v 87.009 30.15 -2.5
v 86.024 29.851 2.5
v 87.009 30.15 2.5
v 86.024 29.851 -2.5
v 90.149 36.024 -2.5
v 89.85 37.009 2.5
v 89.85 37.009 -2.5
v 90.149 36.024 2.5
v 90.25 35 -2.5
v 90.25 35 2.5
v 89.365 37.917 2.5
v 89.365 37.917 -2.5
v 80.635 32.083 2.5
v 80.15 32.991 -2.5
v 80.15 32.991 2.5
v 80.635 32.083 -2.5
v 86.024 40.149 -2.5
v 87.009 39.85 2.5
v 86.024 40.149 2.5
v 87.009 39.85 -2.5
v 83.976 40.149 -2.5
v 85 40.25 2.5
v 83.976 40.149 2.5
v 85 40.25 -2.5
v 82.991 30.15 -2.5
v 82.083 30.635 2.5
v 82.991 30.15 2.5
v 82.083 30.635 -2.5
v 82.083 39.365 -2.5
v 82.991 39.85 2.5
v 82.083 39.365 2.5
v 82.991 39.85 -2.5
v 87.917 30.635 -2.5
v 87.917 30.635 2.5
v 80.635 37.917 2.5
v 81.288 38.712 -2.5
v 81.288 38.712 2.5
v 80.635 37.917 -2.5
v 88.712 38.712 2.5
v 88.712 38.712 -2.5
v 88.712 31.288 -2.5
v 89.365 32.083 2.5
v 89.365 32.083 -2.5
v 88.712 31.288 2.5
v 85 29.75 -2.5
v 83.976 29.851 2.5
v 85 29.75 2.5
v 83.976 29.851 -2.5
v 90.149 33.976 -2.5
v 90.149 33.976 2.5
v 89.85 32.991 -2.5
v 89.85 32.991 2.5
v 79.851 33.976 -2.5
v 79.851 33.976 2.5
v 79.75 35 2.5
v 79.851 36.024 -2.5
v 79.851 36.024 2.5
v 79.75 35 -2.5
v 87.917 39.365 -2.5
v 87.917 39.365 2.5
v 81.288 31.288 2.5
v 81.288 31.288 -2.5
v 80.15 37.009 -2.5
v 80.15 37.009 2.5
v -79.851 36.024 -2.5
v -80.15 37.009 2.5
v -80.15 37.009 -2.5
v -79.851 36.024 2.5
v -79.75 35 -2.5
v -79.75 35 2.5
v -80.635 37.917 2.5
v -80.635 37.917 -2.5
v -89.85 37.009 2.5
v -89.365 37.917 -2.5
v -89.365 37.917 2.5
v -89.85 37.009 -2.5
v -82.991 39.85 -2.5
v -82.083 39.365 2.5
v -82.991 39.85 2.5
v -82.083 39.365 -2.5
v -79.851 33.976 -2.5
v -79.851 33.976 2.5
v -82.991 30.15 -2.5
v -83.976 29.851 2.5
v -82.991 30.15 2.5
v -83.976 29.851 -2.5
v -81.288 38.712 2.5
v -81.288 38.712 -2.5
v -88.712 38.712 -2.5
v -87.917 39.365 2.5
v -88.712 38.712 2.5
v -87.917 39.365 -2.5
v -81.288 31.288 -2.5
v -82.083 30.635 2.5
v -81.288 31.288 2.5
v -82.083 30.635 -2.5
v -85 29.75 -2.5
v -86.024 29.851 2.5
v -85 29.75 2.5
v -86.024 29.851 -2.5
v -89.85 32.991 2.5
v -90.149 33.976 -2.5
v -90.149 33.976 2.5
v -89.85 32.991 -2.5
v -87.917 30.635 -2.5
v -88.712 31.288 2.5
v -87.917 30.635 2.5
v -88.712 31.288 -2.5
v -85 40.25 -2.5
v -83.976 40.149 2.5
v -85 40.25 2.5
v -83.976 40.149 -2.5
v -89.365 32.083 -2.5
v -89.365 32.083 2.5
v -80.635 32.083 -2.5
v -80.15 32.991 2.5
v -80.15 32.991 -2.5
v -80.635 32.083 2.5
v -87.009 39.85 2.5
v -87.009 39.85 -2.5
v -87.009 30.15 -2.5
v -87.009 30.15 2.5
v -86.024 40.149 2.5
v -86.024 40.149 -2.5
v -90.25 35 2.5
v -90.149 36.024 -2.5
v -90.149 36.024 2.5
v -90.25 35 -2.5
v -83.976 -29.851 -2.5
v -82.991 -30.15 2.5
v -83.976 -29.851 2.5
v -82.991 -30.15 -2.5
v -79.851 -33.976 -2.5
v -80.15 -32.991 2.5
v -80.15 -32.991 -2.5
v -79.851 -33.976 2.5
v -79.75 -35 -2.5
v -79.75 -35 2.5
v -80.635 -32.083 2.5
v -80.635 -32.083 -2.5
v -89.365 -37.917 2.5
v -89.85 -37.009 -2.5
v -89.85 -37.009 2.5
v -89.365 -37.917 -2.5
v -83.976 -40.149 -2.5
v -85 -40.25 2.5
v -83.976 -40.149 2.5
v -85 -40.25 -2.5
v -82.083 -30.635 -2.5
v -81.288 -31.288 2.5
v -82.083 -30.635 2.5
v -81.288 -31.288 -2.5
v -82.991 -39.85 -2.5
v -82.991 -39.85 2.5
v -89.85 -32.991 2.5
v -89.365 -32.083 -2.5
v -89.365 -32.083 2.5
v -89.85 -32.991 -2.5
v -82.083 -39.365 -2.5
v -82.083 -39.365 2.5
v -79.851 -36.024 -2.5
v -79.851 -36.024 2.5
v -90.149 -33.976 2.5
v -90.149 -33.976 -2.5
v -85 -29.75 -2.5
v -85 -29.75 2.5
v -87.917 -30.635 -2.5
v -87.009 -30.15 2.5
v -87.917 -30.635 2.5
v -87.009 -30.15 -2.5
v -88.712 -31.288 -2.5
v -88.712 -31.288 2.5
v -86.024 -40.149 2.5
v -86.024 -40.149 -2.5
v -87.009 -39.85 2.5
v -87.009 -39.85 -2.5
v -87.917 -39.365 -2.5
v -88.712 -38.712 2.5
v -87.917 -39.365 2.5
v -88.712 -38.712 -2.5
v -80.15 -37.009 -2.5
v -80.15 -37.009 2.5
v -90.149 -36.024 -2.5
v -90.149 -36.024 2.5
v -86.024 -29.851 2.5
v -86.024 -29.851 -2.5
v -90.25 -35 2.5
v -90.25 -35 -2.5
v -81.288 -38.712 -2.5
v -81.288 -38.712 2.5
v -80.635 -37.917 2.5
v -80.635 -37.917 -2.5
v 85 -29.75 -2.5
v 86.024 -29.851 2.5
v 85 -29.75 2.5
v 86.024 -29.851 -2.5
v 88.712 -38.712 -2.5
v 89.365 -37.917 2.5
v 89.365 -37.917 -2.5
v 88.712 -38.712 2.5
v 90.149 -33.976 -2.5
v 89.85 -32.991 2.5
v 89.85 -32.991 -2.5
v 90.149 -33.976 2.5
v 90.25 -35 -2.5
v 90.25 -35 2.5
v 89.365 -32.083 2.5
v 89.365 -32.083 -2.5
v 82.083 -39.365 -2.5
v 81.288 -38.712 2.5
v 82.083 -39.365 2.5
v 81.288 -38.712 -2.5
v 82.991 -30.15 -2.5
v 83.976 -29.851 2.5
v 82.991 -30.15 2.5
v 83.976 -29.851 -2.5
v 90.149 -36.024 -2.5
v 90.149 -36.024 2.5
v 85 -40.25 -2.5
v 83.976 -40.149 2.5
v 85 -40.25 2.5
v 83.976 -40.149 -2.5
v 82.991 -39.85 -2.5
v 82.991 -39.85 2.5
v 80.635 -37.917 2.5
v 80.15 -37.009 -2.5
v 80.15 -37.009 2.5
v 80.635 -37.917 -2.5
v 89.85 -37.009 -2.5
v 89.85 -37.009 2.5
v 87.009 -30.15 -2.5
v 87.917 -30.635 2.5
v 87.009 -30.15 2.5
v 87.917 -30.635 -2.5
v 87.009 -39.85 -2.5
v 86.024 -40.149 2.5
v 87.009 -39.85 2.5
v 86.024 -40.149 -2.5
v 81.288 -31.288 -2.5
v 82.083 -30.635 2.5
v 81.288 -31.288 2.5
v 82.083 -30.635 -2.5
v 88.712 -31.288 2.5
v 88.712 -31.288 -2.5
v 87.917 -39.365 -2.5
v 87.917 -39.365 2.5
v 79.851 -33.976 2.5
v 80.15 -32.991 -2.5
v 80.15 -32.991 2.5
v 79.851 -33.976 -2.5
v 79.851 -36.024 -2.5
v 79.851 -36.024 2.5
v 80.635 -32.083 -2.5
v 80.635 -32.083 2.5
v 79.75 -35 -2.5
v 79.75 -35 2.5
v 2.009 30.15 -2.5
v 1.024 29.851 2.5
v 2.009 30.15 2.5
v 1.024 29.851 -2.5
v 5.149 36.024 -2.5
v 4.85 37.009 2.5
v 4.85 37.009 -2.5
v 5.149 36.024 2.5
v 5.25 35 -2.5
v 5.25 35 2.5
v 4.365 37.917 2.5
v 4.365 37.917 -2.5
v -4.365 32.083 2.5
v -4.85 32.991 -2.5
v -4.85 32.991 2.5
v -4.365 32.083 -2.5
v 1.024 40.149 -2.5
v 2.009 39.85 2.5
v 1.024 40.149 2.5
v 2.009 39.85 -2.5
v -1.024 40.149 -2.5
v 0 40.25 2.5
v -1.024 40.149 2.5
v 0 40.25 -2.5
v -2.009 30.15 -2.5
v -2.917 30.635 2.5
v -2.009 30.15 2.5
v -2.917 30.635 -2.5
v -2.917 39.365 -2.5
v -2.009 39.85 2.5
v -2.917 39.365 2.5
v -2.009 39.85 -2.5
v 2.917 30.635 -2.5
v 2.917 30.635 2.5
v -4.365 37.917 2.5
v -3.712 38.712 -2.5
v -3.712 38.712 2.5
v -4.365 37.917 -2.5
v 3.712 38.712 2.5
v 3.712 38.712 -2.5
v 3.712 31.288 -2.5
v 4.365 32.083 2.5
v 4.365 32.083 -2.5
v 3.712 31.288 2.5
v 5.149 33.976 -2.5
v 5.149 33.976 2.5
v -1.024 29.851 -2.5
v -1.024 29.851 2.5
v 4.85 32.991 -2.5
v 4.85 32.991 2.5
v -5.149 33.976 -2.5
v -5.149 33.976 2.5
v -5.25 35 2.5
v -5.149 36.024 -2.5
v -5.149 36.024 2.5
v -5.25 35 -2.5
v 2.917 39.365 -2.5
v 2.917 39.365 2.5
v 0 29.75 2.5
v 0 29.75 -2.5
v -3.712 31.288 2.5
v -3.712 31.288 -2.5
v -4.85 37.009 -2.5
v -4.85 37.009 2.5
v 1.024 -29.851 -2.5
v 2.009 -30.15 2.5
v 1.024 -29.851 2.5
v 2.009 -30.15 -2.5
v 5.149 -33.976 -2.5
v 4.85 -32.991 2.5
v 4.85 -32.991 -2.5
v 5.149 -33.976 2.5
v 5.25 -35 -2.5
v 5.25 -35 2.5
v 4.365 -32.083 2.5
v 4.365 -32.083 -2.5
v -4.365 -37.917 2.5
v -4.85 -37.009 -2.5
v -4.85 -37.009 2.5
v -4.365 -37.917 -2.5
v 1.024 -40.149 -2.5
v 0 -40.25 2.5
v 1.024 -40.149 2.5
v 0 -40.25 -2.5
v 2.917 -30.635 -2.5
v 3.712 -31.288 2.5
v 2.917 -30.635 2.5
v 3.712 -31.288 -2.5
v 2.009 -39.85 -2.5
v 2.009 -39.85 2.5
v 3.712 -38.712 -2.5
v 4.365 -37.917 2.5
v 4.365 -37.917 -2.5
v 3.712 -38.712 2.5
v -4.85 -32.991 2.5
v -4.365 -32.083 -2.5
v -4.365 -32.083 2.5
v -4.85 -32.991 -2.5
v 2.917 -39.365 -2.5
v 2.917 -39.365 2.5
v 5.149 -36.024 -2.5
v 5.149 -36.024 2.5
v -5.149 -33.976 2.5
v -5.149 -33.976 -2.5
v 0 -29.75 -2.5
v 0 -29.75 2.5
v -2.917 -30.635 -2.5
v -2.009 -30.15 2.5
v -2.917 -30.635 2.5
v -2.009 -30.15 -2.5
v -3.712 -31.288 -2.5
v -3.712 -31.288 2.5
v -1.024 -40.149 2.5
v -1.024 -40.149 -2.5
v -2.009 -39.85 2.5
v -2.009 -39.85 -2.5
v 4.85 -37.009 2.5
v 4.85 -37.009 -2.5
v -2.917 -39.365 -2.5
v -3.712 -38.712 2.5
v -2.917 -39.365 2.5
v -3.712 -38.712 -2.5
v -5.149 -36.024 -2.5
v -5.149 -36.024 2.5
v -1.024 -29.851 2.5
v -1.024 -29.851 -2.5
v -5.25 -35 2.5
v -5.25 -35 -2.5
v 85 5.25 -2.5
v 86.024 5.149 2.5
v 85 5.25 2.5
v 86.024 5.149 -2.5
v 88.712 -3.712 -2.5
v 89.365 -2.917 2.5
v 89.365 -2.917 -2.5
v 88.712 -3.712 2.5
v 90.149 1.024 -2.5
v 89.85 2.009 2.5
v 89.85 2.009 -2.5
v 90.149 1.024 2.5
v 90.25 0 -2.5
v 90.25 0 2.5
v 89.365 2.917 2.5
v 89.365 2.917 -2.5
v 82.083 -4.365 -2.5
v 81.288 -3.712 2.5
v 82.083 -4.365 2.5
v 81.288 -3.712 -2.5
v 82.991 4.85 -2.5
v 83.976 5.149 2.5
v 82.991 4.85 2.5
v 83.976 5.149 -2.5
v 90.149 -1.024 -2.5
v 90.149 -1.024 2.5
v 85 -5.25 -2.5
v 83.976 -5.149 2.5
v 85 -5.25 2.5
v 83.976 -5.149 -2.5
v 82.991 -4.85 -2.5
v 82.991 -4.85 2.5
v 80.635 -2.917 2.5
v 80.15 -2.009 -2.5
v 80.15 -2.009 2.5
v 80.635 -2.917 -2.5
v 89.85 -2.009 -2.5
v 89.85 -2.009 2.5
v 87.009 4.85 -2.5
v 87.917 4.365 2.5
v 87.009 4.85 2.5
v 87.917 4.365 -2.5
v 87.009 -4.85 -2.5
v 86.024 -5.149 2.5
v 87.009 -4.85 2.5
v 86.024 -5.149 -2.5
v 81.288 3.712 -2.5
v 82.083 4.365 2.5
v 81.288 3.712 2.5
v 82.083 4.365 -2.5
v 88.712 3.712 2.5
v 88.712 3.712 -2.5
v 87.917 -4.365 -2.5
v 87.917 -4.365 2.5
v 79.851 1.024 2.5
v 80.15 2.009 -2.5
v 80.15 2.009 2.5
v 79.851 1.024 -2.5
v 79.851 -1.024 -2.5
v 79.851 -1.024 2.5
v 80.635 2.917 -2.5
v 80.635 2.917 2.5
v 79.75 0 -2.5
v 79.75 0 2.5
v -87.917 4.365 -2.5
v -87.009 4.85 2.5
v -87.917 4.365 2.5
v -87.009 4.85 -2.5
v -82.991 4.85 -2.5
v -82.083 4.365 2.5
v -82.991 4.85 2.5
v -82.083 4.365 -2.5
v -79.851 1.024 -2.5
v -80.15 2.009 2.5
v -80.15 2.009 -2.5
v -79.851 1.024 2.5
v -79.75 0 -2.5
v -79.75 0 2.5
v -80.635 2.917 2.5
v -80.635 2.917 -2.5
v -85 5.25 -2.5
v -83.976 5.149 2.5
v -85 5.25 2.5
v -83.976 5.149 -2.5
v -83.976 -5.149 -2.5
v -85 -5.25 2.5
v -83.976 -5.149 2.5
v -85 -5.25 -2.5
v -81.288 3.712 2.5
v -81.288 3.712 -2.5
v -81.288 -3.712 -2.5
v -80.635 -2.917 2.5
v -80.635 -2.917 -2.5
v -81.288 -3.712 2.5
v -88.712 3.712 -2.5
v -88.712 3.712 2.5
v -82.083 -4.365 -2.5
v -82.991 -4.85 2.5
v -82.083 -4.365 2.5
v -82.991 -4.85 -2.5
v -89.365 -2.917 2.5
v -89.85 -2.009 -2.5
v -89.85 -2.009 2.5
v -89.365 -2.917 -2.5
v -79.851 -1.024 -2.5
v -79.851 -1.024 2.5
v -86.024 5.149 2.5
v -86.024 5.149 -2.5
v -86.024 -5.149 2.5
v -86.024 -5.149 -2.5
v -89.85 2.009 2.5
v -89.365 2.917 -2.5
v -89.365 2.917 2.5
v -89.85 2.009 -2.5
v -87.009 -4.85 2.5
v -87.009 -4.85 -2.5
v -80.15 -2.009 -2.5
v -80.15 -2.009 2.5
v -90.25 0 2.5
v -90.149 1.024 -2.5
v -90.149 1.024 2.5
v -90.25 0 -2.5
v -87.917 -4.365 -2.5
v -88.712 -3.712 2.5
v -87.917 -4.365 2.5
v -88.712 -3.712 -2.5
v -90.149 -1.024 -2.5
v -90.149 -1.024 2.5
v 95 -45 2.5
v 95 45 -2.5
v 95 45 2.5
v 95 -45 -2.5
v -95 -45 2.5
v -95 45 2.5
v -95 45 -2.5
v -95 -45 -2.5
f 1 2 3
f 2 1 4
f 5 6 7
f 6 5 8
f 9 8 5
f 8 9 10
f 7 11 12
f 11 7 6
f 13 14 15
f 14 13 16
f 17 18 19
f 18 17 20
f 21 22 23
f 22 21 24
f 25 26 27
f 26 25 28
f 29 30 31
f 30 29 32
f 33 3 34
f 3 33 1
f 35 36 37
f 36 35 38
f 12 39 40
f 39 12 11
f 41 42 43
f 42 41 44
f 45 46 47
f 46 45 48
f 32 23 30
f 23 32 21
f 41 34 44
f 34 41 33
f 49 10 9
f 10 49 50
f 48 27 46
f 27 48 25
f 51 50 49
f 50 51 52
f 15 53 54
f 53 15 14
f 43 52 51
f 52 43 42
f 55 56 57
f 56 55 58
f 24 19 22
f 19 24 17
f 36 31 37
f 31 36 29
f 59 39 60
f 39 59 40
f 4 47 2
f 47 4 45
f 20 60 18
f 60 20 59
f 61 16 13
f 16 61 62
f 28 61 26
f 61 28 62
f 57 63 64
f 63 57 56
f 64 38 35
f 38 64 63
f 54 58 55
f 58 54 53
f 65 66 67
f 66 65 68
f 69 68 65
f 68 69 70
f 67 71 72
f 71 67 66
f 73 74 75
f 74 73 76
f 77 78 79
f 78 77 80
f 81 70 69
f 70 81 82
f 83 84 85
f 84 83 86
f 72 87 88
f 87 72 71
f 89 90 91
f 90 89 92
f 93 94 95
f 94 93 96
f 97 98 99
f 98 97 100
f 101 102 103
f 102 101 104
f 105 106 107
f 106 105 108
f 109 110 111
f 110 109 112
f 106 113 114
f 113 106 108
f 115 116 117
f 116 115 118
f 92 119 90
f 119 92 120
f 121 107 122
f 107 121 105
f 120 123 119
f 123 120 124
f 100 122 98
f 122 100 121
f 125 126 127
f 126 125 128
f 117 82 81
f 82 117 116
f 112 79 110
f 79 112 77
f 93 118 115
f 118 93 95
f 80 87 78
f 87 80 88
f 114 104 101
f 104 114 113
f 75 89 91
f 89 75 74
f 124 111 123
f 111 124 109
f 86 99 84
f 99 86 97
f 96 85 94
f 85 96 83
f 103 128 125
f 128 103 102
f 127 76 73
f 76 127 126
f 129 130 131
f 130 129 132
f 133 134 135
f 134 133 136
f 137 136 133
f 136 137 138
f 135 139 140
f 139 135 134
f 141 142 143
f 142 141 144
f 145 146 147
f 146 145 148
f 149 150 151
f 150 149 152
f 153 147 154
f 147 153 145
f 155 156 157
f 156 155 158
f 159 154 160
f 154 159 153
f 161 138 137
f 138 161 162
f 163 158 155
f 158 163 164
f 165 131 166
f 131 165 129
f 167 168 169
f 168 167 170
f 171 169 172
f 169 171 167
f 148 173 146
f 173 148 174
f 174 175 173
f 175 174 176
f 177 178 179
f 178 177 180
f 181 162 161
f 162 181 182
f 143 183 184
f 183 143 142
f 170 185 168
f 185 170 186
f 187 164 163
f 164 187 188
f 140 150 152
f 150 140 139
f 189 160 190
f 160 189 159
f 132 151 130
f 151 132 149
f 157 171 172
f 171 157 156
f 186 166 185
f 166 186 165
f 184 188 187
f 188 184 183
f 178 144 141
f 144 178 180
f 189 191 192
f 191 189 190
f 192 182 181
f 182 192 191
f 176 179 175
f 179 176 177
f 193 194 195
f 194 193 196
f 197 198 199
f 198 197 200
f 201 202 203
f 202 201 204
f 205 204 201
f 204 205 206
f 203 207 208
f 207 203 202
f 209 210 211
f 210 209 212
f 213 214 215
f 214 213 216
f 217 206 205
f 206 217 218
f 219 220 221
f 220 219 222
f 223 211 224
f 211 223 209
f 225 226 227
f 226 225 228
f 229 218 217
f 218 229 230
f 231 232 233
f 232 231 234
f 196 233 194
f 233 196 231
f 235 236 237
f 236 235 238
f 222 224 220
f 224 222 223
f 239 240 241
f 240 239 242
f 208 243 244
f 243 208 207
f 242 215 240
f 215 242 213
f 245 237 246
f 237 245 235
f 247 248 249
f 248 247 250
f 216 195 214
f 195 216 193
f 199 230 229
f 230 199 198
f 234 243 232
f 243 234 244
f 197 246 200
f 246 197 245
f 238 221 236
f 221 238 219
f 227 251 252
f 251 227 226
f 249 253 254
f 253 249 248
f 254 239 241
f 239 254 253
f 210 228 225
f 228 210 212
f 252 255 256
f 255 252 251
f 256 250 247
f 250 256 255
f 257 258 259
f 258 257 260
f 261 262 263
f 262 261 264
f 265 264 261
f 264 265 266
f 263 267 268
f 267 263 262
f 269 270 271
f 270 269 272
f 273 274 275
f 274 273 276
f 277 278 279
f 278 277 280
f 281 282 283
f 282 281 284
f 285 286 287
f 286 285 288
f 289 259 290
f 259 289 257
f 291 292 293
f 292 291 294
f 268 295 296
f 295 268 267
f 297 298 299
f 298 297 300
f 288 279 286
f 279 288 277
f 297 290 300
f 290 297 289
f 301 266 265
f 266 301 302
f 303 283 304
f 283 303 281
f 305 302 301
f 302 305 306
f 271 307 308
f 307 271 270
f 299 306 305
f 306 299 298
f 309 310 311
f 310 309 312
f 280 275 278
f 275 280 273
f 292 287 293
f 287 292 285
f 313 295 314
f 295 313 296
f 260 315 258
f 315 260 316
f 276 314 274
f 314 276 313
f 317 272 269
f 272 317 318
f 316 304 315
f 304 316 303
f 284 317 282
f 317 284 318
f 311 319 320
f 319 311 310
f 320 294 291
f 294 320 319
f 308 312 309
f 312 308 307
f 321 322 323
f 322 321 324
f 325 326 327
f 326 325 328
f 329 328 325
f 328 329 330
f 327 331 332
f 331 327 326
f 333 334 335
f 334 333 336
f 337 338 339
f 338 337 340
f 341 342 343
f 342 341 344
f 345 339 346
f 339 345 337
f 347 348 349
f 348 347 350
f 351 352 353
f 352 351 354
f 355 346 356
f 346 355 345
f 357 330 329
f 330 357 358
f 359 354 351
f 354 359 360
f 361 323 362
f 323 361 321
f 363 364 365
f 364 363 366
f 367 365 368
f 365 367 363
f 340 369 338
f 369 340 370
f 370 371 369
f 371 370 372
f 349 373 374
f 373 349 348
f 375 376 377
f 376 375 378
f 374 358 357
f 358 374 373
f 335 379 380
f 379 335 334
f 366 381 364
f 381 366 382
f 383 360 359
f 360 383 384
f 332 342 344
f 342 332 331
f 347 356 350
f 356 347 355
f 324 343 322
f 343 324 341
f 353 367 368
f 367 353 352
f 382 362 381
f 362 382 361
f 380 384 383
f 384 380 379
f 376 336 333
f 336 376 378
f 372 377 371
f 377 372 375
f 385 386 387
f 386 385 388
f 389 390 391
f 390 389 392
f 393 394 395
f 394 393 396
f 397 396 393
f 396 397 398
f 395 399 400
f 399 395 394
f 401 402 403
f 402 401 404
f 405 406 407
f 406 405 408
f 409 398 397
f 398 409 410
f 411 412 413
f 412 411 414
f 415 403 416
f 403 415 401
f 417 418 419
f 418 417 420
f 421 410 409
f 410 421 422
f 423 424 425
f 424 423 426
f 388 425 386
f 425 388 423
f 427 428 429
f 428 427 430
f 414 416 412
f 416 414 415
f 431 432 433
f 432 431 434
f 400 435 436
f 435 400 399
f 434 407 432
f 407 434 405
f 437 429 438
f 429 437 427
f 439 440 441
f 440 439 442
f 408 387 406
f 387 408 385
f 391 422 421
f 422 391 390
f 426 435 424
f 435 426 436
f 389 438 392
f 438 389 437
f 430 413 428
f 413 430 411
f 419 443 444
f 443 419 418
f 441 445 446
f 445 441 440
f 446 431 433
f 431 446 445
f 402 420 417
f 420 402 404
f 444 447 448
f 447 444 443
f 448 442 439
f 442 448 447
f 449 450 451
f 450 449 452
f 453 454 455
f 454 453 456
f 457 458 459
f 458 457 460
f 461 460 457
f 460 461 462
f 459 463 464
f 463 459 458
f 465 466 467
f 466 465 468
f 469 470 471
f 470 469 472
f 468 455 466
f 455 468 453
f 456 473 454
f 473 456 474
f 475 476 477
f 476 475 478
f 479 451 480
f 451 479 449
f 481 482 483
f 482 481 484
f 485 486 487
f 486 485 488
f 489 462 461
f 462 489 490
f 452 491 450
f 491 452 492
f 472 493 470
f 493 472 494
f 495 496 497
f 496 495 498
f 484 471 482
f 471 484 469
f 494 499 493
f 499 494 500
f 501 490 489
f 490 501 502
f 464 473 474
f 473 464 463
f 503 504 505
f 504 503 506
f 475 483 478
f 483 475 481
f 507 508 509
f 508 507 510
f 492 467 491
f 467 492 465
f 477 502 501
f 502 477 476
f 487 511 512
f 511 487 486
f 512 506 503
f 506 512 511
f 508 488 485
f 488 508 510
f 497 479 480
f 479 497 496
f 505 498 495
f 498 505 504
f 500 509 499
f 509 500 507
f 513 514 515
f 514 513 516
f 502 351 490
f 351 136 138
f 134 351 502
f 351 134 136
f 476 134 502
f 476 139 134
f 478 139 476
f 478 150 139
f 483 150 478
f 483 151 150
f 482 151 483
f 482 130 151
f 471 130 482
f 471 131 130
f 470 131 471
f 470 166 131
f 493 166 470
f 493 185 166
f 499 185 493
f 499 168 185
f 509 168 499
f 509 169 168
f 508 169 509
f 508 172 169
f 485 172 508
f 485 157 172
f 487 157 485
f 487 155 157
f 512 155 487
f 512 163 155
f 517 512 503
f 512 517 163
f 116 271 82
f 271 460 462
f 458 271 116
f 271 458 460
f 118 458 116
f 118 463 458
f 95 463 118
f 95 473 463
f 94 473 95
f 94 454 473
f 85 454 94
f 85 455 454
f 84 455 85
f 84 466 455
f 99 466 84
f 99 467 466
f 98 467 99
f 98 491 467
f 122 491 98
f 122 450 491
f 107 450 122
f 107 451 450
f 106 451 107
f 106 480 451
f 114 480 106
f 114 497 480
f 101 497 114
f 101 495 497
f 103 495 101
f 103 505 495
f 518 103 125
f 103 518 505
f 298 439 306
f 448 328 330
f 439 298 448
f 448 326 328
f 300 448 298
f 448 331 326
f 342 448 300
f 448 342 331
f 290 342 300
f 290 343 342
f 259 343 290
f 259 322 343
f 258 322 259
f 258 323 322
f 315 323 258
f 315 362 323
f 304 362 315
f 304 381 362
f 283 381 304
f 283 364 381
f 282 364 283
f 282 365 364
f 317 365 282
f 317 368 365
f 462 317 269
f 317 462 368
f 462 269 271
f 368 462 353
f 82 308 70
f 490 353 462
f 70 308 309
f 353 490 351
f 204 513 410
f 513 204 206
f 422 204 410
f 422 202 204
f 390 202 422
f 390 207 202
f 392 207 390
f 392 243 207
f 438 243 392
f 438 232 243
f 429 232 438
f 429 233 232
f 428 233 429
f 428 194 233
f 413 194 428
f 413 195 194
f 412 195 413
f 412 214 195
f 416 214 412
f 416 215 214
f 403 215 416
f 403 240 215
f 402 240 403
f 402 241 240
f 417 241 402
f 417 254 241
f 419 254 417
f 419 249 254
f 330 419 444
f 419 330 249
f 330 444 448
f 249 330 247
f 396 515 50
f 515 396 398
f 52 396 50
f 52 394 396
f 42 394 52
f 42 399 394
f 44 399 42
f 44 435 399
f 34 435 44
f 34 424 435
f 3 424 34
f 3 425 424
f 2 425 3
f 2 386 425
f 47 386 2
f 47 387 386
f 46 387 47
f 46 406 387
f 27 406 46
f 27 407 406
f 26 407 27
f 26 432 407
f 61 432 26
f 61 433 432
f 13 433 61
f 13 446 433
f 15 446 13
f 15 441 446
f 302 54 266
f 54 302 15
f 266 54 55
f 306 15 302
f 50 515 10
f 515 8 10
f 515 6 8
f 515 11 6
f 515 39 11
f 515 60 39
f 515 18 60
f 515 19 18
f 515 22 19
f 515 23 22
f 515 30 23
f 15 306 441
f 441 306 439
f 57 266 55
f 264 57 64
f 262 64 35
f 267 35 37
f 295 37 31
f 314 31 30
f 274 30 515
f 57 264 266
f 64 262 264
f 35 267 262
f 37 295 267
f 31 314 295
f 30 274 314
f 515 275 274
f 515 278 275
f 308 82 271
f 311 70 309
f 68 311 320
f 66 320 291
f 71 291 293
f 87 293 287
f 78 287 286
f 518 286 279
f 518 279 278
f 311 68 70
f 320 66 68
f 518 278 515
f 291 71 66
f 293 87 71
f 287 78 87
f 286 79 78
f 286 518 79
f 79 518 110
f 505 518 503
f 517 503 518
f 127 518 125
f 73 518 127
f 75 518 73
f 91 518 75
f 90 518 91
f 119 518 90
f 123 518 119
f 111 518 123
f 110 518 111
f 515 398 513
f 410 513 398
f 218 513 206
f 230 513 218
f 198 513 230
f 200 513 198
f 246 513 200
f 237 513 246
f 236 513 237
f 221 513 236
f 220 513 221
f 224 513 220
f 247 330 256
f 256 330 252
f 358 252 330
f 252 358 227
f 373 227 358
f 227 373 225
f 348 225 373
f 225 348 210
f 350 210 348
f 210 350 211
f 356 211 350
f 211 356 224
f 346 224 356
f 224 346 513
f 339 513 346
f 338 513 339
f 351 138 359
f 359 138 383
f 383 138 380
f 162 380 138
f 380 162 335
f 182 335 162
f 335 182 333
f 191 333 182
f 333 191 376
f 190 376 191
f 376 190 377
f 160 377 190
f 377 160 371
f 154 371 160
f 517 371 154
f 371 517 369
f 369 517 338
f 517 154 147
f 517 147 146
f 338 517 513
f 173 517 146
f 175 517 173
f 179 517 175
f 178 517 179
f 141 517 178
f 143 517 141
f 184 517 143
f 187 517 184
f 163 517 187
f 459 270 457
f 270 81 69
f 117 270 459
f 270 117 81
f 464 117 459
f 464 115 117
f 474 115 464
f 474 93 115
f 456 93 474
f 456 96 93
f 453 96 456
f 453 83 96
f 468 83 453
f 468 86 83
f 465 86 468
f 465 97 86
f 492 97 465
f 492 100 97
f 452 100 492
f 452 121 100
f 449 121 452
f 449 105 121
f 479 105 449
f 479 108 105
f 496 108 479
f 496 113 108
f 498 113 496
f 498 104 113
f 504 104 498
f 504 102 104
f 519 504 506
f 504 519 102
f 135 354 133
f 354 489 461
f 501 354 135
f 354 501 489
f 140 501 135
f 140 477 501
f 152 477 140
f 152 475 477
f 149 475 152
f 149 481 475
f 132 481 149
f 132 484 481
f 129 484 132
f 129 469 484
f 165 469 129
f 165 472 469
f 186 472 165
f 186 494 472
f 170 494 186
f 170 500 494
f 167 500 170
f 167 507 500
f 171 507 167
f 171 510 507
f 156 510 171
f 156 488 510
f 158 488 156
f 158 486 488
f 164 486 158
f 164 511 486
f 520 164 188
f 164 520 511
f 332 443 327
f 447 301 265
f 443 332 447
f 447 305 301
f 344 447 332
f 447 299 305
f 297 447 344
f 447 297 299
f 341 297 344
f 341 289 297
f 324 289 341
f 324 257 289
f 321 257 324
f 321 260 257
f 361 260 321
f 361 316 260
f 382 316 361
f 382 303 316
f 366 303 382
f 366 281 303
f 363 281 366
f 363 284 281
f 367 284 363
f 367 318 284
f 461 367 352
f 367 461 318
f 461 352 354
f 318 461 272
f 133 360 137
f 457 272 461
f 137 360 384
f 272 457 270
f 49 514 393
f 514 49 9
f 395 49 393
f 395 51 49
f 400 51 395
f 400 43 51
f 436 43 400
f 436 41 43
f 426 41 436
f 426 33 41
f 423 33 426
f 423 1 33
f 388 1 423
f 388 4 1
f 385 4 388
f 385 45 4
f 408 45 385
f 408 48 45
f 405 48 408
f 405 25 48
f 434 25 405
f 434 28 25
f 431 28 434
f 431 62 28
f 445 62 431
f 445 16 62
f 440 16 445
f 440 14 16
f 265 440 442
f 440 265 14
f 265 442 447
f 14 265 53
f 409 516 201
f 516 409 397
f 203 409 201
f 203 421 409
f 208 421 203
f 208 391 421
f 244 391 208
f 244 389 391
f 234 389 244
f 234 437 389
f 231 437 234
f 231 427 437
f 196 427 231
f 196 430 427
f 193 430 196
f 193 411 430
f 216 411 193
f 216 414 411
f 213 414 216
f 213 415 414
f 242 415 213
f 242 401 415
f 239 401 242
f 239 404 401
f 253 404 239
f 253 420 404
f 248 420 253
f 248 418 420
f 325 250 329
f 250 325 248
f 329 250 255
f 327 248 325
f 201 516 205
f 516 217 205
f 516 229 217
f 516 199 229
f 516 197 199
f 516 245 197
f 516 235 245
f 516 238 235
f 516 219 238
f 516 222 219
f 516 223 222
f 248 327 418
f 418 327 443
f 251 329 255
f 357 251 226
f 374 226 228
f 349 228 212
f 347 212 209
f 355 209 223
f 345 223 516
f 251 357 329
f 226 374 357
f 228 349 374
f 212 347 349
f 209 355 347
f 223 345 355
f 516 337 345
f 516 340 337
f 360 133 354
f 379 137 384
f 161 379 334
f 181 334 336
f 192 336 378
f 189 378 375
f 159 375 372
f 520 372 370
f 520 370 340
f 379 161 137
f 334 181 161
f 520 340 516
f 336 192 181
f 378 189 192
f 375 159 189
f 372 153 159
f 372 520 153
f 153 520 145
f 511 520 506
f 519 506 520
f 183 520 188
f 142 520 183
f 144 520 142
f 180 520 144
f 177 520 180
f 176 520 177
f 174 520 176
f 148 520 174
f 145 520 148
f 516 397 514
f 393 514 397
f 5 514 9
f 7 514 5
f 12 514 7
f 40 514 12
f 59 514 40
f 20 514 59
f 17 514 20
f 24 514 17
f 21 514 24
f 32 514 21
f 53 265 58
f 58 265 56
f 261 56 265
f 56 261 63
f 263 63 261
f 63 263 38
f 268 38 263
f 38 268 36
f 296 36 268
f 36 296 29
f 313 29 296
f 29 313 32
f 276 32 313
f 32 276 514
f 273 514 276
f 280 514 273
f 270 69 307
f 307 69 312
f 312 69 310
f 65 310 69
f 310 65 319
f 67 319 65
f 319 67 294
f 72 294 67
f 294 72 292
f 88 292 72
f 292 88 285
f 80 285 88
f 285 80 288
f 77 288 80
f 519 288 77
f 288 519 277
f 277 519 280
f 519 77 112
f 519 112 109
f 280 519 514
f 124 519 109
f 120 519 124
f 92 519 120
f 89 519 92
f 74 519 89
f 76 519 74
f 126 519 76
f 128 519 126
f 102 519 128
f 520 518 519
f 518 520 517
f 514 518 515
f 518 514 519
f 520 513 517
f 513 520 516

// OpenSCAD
$fn = 32;

// ----------------------------------------------------------------------
// Corner plate 190 x 90 x 5
// 8 holes, centres taken from the edge offset
// ----------------------------------------------------------------------

// --- parameters (mm) ---
plate = [190, 90, 5];  // overall size (x, y, z)
holes = 8;             // number of holes the drawing asks for
hole_d = 10.5;         // hole diameter
edge = 10;             // hole centre offset from the plate edge

// --- derived feature positions (mm) ---
corner_x = plate[0] / 2 - edge;  // = 85   corner hole X
corner_y = plate[1] / 2 - edge;  // = 35   corner hole Y
feature_centers = [
  [corner_x, corner_y],
  [-corner_x, corner_y],
  [-corner_x, -corner_y],
  [corner_x, -corner_y],
  [0, corner_y],
  [0, -corner_y],
  [corner_x, 0],
  [-corner_x, 0]
];   // hole centres the loop below drills

// plate outline, every hole drilled through with the same cutters
difference() {
  cube(plate, center = true);
  for (centre = feature_centers)
    translate([centre[0], centre[1], 0])
      cylinder(d = hole_d, h = plate[2] + 2, center = true);
}
